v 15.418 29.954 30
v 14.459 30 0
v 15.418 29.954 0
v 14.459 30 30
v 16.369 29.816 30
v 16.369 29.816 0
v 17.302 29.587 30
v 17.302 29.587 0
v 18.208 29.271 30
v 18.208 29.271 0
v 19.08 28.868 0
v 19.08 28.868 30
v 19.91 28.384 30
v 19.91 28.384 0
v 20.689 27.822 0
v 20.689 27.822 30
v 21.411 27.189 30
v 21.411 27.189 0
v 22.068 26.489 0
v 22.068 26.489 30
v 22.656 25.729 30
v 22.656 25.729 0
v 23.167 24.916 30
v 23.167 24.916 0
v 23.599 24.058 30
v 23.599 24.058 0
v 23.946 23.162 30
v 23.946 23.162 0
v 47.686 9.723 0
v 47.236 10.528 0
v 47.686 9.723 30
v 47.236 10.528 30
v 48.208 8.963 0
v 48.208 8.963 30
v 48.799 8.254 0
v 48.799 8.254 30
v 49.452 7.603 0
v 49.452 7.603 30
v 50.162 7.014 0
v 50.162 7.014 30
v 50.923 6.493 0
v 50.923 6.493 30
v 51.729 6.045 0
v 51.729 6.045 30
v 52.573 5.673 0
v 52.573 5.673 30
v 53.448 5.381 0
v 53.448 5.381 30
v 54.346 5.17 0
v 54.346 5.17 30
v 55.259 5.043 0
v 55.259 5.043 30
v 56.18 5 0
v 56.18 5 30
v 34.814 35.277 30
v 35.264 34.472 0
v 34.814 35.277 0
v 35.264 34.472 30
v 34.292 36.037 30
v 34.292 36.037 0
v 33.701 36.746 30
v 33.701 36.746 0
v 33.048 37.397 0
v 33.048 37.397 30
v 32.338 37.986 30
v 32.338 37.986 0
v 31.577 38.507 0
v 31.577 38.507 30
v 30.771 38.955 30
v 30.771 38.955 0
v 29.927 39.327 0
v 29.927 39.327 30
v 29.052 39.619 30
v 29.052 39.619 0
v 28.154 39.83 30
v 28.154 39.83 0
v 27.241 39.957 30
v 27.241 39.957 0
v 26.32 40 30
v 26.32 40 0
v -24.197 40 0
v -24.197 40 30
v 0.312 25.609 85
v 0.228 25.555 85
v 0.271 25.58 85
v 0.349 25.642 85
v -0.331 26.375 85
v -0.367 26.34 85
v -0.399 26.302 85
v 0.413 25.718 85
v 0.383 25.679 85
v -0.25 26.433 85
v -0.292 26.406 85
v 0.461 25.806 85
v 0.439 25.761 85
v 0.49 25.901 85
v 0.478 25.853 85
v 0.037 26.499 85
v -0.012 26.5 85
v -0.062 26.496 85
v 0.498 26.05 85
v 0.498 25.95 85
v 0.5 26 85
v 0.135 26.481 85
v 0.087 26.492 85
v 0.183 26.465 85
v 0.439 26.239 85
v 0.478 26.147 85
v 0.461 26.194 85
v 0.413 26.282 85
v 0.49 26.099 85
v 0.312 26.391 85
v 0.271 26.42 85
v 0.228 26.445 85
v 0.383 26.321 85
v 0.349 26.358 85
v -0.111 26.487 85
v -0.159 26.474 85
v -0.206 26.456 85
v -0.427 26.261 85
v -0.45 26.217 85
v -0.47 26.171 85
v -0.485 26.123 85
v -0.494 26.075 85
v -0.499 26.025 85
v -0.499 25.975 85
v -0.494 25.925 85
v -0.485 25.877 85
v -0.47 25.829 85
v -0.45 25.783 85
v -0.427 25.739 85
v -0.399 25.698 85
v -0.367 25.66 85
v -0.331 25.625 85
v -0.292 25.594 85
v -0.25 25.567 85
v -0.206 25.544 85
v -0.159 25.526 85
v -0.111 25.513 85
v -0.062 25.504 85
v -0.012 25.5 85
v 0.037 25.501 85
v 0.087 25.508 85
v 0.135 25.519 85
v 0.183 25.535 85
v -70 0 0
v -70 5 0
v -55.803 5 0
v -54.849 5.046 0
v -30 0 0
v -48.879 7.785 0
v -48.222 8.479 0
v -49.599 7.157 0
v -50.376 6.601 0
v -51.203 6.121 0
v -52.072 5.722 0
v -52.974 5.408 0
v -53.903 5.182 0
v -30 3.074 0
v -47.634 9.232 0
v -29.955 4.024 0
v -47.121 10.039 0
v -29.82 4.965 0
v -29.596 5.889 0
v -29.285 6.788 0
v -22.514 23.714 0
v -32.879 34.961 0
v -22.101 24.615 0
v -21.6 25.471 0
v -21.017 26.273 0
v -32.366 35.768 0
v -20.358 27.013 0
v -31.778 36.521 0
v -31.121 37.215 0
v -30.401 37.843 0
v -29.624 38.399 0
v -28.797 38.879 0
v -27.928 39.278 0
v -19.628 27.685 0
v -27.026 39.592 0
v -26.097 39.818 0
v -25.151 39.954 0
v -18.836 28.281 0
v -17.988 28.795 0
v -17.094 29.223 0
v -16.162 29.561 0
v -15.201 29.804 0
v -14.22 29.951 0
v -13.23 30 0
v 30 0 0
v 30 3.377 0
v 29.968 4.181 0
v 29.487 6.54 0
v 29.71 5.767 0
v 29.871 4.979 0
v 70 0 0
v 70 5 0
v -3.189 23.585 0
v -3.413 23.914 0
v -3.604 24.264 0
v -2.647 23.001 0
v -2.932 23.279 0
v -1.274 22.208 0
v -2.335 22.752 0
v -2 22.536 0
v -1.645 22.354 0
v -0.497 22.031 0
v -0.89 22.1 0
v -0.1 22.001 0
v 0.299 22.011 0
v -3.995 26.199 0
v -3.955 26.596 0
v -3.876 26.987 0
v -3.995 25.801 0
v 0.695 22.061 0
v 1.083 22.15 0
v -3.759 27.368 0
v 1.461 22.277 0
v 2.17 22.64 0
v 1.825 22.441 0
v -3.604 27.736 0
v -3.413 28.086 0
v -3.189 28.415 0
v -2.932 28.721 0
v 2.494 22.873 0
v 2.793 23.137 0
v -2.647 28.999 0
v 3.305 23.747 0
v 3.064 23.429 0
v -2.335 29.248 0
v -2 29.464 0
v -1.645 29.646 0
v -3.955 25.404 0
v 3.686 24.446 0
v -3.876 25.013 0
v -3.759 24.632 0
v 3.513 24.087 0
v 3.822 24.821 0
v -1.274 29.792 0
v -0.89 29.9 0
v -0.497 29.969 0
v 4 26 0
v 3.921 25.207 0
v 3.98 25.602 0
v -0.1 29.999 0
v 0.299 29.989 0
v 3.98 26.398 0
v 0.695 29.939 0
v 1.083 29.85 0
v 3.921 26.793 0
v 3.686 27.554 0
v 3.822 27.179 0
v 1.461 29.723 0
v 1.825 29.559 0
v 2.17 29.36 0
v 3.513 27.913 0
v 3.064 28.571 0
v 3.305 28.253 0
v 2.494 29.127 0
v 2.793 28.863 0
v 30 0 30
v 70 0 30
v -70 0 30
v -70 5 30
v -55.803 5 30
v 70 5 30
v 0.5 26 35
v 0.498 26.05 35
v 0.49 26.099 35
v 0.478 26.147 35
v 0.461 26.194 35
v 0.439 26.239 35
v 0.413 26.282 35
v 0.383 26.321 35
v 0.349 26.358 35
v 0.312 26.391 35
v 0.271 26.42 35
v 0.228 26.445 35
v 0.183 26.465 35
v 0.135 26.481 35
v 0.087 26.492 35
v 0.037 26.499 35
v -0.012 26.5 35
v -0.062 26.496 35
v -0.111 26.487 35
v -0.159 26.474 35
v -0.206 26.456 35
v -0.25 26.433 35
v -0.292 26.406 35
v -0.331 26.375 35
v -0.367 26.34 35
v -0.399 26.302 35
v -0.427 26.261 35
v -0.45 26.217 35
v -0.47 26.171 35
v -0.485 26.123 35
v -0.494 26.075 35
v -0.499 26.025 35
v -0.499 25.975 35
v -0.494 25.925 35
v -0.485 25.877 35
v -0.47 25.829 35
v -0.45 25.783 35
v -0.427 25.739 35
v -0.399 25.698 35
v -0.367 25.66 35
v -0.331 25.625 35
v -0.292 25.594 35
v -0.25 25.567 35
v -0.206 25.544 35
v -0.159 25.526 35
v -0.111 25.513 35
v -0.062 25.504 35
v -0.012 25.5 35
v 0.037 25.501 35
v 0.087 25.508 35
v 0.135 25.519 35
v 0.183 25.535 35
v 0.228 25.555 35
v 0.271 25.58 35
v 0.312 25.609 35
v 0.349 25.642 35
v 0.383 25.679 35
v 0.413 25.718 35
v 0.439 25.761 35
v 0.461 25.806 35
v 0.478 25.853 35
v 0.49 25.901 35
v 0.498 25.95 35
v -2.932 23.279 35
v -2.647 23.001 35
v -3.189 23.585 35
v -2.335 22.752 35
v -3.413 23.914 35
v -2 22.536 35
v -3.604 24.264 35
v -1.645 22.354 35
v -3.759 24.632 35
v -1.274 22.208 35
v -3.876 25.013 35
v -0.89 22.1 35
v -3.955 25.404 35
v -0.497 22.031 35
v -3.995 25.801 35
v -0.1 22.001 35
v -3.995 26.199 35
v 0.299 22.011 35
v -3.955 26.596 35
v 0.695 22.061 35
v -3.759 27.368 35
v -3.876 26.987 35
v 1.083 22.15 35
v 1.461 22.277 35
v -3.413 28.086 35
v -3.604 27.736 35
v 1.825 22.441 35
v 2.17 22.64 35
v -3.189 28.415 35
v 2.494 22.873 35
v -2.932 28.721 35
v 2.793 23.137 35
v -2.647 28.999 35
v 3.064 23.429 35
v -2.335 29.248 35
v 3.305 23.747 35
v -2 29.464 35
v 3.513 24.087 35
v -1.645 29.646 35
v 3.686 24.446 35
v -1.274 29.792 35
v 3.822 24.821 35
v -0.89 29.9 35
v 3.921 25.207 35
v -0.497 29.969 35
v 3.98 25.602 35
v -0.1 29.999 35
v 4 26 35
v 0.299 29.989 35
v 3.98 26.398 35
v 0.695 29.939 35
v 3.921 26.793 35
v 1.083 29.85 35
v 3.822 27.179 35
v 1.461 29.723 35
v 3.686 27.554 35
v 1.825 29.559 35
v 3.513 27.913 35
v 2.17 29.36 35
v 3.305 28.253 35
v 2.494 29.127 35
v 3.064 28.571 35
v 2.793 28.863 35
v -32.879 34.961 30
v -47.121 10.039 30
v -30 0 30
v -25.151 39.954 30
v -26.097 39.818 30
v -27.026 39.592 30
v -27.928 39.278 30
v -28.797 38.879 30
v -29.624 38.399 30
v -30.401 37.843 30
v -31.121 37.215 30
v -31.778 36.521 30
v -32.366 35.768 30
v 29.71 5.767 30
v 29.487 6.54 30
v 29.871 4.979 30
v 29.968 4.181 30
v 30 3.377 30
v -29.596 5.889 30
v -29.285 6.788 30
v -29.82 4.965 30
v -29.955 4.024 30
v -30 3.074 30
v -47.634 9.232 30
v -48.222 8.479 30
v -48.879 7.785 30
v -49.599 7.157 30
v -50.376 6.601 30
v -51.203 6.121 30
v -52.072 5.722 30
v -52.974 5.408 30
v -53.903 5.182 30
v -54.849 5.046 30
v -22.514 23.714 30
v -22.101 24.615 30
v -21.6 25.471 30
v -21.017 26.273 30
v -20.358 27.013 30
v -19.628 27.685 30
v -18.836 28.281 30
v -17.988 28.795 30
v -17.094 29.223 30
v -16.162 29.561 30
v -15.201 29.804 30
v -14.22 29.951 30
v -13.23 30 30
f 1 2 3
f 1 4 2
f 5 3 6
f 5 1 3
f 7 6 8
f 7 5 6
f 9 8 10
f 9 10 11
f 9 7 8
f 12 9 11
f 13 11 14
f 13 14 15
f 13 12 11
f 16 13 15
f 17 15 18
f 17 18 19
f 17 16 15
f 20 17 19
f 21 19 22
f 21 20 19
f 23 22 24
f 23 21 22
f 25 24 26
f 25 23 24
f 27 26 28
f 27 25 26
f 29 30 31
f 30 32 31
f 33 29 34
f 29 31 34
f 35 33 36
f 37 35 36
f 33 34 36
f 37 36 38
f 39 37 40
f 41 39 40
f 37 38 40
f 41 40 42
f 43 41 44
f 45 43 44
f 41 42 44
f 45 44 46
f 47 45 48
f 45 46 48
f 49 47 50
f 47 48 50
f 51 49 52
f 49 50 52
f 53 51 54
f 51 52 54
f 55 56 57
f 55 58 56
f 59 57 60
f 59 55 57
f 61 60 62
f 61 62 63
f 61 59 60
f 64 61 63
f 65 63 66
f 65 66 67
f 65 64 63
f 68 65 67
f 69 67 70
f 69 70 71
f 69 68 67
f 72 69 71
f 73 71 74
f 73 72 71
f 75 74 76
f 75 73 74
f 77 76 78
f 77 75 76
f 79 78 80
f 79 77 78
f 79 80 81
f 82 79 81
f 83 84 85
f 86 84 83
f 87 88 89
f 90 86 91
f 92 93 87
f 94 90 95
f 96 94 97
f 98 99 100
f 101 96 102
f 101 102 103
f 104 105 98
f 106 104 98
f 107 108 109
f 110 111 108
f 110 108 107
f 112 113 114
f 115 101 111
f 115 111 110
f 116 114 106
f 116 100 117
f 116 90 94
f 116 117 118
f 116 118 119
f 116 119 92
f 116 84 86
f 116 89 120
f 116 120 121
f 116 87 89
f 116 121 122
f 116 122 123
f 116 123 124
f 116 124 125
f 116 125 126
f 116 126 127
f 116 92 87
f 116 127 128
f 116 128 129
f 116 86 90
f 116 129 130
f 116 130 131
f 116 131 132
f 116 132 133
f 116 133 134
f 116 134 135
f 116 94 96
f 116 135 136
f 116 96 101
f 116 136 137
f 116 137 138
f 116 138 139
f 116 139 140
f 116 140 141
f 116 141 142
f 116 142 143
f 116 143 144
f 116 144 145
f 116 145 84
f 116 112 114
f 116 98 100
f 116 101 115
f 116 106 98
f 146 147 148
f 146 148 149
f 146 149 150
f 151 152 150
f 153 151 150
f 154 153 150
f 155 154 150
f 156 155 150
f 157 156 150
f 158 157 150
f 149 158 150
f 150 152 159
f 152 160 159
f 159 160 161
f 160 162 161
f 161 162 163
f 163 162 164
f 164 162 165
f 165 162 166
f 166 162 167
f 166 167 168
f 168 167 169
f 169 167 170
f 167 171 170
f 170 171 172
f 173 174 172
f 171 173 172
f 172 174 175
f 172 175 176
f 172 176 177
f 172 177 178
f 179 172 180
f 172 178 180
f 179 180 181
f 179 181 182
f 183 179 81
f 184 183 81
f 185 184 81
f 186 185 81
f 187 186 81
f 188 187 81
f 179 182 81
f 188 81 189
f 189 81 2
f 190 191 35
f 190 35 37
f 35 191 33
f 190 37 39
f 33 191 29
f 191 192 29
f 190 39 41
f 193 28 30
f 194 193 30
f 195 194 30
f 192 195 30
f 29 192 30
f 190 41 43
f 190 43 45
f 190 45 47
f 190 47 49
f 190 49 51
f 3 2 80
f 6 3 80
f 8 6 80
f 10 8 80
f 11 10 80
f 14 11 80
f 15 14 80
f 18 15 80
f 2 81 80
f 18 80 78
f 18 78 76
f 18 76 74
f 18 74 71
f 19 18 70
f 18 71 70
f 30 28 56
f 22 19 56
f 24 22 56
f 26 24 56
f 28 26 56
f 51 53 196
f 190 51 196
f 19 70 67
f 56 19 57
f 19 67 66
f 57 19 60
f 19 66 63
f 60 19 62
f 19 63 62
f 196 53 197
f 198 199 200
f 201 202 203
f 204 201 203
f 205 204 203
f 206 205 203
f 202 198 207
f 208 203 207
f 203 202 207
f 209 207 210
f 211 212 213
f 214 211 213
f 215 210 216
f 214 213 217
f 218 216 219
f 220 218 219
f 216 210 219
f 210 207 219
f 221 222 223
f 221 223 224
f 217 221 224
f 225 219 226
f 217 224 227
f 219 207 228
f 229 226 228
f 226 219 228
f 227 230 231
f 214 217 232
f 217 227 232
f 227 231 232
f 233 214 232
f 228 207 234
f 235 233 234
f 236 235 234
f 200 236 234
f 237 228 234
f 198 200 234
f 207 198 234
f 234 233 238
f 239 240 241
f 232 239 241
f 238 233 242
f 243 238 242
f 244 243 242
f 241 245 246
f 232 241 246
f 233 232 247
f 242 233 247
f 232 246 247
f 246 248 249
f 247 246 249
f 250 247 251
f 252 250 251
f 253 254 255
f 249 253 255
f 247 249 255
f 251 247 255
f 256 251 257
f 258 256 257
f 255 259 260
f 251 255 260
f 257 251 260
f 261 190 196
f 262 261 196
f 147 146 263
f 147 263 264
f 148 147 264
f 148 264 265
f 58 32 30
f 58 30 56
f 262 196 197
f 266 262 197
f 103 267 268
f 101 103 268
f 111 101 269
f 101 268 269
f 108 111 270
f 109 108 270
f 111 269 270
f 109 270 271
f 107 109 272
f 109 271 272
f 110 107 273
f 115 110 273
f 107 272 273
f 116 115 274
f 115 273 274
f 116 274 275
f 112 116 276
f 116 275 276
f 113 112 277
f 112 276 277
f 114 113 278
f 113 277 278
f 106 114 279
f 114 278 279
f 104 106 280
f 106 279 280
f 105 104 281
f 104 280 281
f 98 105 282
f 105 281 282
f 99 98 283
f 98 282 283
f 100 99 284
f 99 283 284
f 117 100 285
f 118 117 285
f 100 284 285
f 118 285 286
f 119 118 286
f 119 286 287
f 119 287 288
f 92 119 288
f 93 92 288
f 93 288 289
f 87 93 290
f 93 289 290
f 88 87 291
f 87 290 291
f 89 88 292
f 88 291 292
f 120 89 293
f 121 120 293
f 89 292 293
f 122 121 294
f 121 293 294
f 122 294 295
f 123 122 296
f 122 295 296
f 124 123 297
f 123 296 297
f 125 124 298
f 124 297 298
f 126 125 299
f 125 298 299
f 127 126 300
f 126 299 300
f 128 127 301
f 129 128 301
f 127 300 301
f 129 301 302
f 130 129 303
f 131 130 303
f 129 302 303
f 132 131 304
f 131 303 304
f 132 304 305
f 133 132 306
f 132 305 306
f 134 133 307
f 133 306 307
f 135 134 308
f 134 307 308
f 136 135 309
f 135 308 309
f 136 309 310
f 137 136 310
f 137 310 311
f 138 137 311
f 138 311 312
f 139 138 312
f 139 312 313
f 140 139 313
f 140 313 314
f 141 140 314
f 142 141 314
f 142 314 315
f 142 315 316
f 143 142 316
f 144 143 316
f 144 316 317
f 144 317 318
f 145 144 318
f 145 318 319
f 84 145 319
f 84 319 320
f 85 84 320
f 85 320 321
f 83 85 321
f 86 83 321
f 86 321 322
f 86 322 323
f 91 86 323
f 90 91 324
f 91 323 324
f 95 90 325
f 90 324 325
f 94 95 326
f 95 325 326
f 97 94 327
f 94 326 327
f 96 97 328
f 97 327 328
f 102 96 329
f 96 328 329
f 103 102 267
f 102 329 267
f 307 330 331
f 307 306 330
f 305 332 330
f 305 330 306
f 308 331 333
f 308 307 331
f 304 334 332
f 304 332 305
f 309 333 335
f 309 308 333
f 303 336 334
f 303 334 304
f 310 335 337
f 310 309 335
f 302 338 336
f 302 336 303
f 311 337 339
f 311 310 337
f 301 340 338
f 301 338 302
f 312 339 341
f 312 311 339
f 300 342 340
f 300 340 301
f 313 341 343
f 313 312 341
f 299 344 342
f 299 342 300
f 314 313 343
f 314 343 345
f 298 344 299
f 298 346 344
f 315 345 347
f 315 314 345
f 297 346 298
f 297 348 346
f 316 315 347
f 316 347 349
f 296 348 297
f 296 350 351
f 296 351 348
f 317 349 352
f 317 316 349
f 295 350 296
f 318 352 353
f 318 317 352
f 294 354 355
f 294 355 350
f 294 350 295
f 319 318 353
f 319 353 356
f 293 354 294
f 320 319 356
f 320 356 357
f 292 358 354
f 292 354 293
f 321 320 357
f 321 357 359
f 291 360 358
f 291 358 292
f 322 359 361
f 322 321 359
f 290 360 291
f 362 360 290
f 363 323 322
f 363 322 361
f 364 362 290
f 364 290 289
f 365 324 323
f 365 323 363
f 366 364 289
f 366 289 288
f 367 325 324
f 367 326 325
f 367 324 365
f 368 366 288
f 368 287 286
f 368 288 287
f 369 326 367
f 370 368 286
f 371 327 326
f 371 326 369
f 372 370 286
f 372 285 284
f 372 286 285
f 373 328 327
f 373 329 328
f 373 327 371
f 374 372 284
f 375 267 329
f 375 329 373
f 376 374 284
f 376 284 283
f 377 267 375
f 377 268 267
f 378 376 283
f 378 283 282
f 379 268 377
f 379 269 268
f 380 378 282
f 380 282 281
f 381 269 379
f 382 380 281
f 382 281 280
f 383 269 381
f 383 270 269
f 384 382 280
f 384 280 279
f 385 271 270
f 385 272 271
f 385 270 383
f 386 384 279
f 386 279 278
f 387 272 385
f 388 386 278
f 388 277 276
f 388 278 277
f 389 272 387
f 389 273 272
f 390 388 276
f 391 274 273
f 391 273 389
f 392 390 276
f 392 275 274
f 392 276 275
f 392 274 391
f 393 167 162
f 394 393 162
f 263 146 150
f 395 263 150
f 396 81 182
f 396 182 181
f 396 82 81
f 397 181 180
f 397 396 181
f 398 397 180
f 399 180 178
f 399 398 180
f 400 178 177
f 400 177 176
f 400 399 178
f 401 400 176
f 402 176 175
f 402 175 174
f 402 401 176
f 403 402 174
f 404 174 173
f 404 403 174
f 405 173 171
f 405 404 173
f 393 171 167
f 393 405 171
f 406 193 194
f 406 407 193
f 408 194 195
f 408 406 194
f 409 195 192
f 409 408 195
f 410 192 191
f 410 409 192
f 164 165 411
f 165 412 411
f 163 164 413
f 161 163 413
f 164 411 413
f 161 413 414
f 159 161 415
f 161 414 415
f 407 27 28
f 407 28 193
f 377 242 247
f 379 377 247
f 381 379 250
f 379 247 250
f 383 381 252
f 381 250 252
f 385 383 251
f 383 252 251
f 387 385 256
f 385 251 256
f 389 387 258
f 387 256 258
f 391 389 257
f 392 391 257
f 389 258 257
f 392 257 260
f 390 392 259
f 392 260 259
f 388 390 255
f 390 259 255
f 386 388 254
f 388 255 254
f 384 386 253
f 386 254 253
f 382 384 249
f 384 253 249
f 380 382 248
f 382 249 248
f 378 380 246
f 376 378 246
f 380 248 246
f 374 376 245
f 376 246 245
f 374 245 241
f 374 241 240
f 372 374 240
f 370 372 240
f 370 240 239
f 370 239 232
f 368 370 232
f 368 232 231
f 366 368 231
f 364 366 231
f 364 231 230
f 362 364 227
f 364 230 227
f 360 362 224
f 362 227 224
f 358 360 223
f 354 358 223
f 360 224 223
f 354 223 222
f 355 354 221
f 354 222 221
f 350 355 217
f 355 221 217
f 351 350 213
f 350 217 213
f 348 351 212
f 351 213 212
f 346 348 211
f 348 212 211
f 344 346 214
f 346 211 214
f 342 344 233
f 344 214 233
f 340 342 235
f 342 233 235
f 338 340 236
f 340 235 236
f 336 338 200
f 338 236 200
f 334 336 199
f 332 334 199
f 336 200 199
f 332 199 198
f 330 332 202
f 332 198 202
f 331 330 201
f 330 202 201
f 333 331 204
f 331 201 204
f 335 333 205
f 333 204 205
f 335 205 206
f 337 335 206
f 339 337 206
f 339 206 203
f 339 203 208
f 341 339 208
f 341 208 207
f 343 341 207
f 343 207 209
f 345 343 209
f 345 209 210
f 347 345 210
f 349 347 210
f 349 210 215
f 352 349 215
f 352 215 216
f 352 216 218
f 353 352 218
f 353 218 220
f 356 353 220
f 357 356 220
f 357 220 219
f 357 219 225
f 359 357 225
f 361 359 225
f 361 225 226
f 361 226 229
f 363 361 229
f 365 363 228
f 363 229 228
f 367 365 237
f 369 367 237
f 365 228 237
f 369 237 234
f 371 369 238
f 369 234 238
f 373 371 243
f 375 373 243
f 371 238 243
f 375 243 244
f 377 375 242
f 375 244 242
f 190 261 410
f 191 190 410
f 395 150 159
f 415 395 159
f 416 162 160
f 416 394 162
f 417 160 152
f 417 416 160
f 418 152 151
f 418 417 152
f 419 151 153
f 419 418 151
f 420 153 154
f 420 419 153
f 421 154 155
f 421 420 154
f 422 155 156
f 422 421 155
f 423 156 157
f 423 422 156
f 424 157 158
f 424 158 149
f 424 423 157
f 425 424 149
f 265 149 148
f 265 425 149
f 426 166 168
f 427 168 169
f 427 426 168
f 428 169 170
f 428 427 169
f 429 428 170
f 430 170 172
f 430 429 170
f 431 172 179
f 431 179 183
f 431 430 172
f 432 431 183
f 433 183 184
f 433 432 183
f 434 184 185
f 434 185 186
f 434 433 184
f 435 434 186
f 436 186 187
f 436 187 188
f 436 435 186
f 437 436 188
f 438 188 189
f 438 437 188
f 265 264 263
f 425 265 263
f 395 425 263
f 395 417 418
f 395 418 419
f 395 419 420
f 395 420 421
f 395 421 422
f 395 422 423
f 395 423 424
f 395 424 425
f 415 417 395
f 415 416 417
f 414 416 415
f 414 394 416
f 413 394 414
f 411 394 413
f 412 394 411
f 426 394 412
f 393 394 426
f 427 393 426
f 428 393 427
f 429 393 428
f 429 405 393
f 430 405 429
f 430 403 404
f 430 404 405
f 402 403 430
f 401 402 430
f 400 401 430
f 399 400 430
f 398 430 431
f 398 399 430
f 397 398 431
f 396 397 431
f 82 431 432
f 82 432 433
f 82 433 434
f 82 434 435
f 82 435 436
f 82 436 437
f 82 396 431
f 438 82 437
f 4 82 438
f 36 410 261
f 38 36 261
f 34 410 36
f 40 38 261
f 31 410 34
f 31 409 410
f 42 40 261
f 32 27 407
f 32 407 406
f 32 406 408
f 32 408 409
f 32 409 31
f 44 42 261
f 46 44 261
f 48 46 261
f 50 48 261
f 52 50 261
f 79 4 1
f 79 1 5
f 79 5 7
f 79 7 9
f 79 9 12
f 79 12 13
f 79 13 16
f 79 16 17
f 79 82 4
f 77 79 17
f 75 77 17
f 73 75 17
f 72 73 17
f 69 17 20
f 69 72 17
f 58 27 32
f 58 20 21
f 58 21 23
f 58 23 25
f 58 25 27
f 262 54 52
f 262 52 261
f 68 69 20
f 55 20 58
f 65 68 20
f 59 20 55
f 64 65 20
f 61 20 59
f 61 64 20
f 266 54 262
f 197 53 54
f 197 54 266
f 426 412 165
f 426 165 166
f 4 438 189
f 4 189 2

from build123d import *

# Parameters (mm, degrees)
SZKIC1_W                      = 40
SZKIC1_H                      = 5
DODANIE_WYCI_GNI_CIE1_DEPTH   = 30
DODANIE_WYCI_GNI_CIE1_2_DEPTH = 30
DODANIE_WYCI_GNI_CIE2_DEPTH   = 30
ZAOKR_GLENIE1_R               = 10
SZKIC3_R                      = 4
DODANIE_WYCI_GNI_CIE3_DEPTH   = 35
SZKIC4_R                      = 0.5
DODANIE_WYCI_GNI_CIE4_DEPTH   = 50


with BuildPart() as part:
    # Szkic1 → Dodanie-wyciągnięcie1 (new body)
    with BuildSketch(Plane.XY):
        with Locations((-50, 2.5)):
            Rectangle(SZKIC1_W, SZKIC1_H)
    extrude(amount=DODANIE_WYCI_GNI_CIE1_DEPTH)



with BuildPart() as body_2:
    # Szkic1 → Dodanie-wyci_gni_cie1 2 (new body)
    with BuildSketch(Plane.XY):
        with Locations((50, 2.5)):
            Rectangle(SZKIC1_W, SZKIC1_H)
    extrude(amount=DODANIE_WYCI_GNI_CIE1_2_DEPTH)


with BuildPart() as part_1:
    add(part.part)

    add(body_2.part)  # Dodanie-wyciągnięcie2 merges body 2
    # Szkic2 → Dodanie-wyciągnięcie2 (add)
    with BuildSketch(Plane.XY):
        Polygon((-30, 5), (-20, 30), (21.666666667, 30), (30, 5), (50, 5), (32.5, 40), (-30, 40), (-50, 5), align=None)
    extrude(amount=DODANIE_WYCI_GNI_CIE2_DEPTH)

    # Zaokrąglenie1
    zaokr_glenie1_edges = [part_1.edges().sort_by_distance(p)[0] for p in [
        (-50, 5, 15),
        (-20, 30, 15),
        (21.666666667, 30, 15),
        (30, 5, 15),
        (50, 5, 15),
        (32.5, 40, 15),
        (-30, 40, 15),
        (-30, 5, 15),
    ]]
    fillet(zaokr_glenie1_edges, radius=ZAOKR_GLENIE1_R)


with BuildPart() as body_2_2:
    # Szkic3 → Dodanie-wyciągnięcie3 (new body)
    with BuildSketch(Plane.XY):
        with Locations((0, 26)):
            Circle(SZKIC3_R)
    extrude(amount=DODANIE_WYCI_GNI_CIE3_DEPTH)

    # Szkic4 → Dodanie-wyciągnięcie4 (add)
    with BuildSketch(Plane.XY.offset(35)):
        with Locations((0, 26)):
            Circle(SZKIC4_R)
    extrude(amount=DODANIE_WYCI_GNI_CIE4_DEPTH)


solid = Compound([part_1.part, body_2_2.part])
